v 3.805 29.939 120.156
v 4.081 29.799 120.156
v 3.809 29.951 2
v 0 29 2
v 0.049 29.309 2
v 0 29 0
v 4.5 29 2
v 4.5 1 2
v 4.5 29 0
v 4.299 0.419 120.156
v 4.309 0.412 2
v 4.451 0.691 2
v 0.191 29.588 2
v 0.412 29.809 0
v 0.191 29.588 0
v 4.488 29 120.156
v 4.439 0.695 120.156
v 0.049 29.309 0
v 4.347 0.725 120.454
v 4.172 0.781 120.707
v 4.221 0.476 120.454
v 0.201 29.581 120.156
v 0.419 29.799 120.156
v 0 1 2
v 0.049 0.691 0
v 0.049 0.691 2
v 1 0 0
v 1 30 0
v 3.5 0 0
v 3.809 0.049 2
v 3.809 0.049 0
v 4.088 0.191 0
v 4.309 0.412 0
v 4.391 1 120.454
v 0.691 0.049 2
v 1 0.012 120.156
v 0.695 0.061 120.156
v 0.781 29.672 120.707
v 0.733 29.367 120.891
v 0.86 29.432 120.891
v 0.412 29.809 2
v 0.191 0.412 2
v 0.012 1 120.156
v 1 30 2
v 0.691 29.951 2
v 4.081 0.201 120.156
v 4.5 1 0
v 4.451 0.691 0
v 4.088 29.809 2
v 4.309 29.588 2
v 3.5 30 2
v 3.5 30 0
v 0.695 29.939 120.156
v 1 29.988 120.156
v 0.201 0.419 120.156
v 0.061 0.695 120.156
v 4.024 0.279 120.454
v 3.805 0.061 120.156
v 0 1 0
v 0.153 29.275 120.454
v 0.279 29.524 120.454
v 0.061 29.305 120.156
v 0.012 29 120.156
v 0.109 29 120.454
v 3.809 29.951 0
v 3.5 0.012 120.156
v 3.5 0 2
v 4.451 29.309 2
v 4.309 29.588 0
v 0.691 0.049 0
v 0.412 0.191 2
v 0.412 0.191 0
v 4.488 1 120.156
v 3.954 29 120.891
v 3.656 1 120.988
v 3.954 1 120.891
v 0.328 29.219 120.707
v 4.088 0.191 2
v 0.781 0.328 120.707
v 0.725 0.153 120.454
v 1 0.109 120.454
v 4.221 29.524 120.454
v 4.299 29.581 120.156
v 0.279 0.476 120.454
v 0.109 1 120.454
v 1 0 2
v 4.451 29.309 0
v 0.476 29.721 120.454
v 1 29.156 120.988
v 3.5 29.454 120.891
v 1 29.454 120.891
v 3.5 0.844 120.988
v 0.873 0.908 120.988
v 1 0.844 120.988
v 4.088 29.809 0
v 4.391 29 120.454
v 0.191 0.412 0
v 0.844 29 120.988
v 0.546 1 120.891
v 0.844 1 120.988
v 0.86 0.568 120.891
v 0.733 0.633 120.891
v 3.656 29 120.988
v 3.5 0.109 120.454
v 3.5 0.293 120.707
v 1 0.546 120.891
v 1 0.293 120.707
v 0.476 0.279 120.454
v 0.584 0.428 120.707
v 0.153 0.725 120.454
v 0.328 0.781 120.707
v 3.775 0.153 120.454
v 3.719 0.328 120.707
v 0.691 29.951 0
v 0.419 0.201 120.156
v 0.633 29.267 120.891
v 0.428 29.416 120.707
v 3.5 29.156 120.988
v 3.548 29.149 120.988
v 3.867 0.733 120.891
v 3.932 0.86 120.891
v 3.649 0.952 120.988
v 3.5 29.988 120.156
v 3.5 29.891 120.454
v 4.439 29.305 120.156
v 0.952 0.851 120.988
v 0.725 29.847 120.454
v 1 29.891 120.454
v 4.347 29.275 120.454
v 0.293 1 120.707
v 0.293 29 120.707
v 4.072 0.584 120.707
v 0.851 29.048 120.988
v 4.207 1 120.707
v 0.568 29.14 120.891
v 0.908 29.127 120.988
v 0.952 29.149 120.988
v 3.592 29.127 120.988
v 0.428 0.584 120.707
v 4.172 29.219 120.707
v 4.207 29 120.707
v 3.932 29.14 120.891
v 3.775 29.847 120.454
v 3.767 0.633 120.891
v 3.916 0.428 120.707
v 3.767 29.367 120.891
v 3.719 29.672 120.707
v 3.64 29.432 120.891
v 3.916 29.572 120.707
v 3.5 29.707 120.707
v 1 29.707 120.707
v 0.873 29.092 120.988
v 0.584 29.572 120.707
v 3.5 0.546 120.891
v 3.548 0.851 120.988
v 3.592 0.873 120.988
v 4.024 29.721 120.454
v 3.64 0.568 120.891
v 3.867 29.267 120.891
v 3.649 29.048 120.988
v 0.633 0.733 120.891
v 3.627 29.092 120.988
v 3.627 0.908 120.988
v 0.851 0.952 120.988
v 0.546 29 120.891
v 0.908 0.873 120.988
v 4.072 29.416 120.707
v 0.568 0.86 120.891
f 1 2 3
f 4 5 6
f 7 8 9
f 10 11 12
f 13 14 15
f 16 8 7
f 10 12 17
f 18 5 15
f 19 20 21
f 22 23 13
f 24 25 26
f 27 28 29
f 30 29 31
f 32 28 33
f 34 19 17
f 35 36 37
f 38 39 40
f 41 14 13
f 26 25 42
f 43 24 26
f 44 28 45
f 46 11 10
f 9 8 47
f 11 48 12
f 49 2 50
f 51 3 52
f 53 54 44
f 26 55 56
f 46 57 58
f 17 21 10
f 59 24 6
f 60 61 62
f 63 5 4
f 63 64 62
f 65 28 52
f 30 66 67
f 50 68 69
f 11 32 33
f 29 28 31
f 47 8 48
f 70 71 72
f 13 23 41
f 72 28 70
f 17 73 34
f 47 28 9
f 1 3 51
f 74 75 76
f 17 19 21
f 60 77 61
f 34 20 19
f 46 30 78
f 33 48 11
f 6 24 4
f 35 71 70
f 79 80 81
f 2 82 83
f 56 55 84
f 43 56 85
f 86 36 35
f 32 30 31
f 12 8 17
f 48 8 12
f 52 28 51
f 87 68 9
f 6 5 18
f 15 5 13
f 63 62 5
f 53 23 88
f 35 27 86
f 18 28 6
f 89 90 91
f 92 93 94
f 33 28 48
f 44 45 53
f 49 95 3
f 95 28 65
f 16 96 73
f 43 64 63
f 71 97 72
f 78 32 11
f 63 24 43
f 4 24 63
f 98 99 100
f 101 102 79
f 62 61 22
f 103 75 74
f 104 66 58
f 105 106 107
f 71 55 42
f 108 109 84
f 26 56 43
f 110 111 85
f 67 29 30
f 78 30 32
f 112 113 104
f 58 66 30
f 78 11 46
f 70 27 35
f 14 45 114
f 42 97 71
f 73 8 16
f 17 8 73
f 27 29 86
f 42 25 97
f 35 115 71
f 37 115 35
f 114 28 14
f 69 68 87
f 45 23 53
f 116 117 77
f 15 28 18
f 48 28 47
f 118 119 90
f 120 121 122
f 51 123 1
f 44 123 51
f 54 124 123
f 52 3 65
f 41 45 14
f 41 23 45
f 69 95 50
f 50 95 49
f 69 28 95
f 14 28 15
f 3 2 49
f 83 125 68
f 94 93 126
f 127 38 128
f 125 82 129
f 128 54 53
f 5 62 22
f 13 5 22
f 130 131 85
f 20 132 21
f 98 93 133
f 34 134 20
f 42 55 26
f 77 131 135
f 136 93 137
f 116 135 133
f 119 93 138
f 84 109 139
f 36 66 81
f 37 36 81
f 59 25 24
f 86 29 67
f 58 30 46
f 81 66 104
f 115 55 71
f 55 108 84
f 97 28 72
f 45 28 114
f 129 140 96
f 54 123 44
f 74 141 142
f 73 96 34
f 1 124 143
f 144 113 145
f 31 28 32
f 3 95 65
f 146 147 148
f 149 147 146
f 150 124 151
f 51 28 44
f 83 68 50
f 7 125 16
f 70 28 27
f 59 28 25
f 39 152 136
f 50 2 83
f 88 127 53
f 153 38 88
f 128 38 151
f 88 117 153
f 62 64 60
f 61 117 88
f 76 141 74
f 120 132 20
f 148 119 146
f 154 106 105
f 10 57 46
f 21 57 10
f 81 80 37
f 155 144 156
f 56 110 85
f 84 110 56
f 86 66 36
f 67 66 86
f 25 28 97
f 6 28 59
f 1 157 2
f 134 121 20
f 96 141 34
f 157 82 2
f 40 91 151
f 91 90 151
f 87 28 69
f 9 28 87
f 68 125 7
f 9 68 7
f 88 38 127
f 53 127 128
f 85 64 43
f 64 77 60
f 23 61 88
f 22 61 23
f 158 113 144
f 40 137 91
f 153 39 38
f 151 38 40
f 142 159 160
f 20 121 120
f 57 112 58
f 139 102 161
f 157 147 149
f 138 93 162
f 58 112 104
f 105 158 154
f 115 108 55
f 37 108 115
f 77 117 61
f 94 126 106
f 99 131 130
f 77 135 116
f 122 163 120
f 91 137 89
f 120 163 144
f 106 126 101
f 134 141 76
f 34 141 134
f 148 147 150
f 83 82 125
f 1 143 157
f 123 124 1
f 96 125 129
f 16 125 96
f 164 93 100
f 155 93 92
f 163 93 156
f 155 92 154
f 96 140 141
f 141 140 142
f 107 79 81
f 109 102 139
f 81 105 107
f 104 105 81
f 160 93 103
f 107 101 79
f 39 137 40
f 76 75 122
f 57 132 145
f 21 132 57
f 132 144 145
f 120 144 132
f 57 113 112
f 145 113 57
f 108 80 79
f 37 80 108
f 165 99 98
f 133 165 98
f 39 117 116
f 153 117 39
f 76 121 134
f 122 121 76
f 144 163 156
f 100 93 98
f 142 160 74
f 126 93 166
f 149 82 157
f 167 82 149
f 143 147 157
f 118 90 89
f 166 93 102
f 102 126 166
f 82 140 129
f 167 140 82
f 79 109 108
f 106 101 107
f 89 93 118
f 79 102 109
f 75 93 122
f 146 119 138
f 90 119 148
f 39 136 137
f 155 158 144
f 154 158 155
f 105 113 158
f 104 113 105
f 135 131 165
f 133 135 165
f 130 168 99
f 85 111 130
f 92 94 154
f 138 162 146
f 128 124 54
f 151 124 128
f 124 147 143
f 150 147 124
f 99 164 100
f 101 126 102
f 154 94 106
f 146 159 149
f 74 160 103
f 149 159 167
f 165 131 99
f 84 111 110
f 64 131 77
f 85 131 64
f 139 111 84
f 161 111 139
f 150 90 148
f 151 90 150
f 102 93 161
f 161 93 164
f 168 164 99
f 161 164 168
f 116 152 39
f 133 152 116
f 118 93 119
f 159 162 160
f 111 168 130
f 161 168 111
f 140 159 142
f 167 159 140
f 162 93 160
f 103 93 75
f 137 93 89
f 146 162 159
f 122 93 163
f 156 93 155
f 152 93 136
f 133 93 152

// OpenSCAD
_m3BoltHoleDiameter = 3.2 + 0.2; // plus padding
_m3BoltHoleRadius = _m3BoltHoleDiameter/2;

_mk2HousingLength = 127;
_mk2HousingWidth = 88;
_mk2HousingDepth = 18;

_carraigeThickness = 4.1;
_carraigeLengthSidePadding = 0.2;
_carraigeWidthSidePadding = _carraigeLengthSidePadding;
_carraigeLength = _mk2HousingLength + ((_carraigeThickness + _carraigeLengthSidePadding)*2);
_carraigeWidth = _mk2HousingWidth + ((_carraigeThickness + _carraigeWidthSidePadding)*2);
_carraigeDepth = _carraigeThickness + 14;

_carraigeBeamWidth = 20;
_carraigeRoundingRadius = 1;
_carraigeBeamBoltChannelWidth = _m3BoltHoleDiameter + 0.2; //plus padding
_carraigeBeamBoltChannelCountersinkWidth = _carraigeBeamBoltChannelWidth + 2.5;
_carraigeBeamBoltChannelCountersinkDepth = 3;
_carraigeBeamCutoutRadius = 5;

_tentBeamThickness = 4.5;
_tentBeamWidth = 30;
_tentRoundingRadius = 1;

_tentHeight = 121;
_tentMountingBeamLength = 140;
_tentAngle = 60;

_tentBaseThickness = 5.5;
_tentBaseLength = 130;
_tentBaseWidth = 90;
_frameBaseBeamCutoutOffset = 10;

_baseBeamTriangleCutoutSideLength = _tentBeamWidth*(1/3);
_baseBeamTriangleStrutPadding = 3;
_totalSinglePunchSideLength = _baseBeamTriangleCutoutSideLength + _baseBeamTriangleStrutPadding;

_baseBeamTriangleCutoutEdgePadding = 3.5;
_baseBeamTriangleCutoutLengthOffset = 2.5;
_baseBeamTriangleCutoutWidthOffset = 5;
_baseBeamTriangleWidthQuantity = 6;
_baseBeamTriangleLengthQuantity = 2;

_baseConnectingBeamTriangleCutoutEdgePadding = 3.5;
_baseConnectingBeamTriangleCutoutLengthOffset = 32;
_baseConnectingBeamTriangleCutoutWidthOffset = 2.5;
_baseConnectingBeamTriangleWidthQuantity = 2;
_baseConnectingBeamTriangleLengthQuantity = 5;

_decorativeFrameBeamCutoutRadius = 5;
_decorativeFrameBeamCutoutPadding = 5;
_decorativeFrameBeamCutoutQuantity = 3;
_decorativeFrameBeamCutoutEdgePadding = 10;

/// MAIN START ///
//baseConnectingBeam();
//tentingAssembly();
decorativeFrameBeam(_tentHeight);
//tentingStructure();
//boltChannelPunch(50, _tentBeamThickness+1, _carraigeBeamBoltChannelWidth/2, _carraigeBeamBoltChannelCountersinkWidth/2, _carraigeBeamBoltChannelCountersinkDepth);
//carraigeBeam(50);
//carraige();
/// MAIN END ///

module tentingAssembly()
{
    difference()
    union()
    {
        //possibly break this out into another method
        difference()
        {
            tentingStructure();
            //bolt channel
            //"triangulation"
        }

       translate([7.5,(_tentBaseWidth-_carraigeWidth)/2,1])
            rotate([0,-_tentAngle,0])
                carraige();
    }
}

module tentingStructure()
{
    difference()
    //union()
    {
        union()
        {
            // Parallel to keyboard beam.
            translate([0, (_tentBaseWidth-_tentBeamWidth)/2, 0])
                baseConnectingBeam();

            translate([0, 0, 0])
                baseBeam();
            translate([_tentBaseLength-_tentBeamWidth, 0, 0])
                baseBeam();

            translate([0,0, _tentBaseThickness])
                mountingFrame();
        }

        //Cutout for carraige
        carraigeCutoutSidePadding = 1;
        carraigeCutoutWidth = _carraigeBeamWidth + (carraigeCutoutSidePadding*2);
        translate([7.4, (_tentBaseWidth-carraigeCutoutWidth)/2, 1])
            rotate([0,-_tentAngle,0])
                cube([50, carraigeCutoutWidth, 10]);
    }
}

module baseBeam()
{
    difference()
    {
        roundedCube(size=[_tentBeamWidth, _tentBaseWidth, _tentBaseThickness], radius=_tentRoundingRadius, apply_to="zmax");

        lengthSpaceUnit = _baseBeamTriangleCutoutEdgePadding + _baseBeamTriangleCutoutSideLength;
        widthSpaceUnit = _baseBeamTriangleCutoutEdgePadding + _baseBeamTriangleCutoutSideLength;
        translate([_baseBeamTriangleCutoutLengthOffset, _baseBeamTriangleCutoutWidthOffset,-1])
            for(i=[0:_baseBeamTriangleLengthQuantity-1])
                for(j=[0:_baseBeamTriangleWidthQuantity-1])
                    translate([lengthSpaceUnit*i,widthSpaceUnit*j,-1])
                        boxTrianglePunch(_baseBeamTriangleCutoutSideLength, _baseBeamTriangleStrutPadding, _tentBaseThickness+2);
    }
}

module baseConnectingBeam()
{
    difference()
    {
        roundedCube(size=[_tentBaseLength, _tentBeamWidth, _tentBaseThickness], radius=_tentRoundingRadius, apply_to="zmax");

        lengthSpaceUnit = _baseBeamTriangleCutoutEdgePadding + _baseBeamTriangleCutoutSideLength;
        widthSpaceUnit = _baseBeamTriangleCutoutEdgePadding + _baseBeamTriangleCutoutSideLength;
        translate([_baseConnectingBeamTriangleCutoutLengthOffset, _baseConnectingBeamTriangleCutoutWidthOffset,-1])
            for(i=[0:_baseConnectingBeamTriangleLengthQuantity-1])
                for(j=[0:_baseConnectingBeamTriangleWidthQuantity-1])
                    translate([lengthSpaceUnit*i,widthSpaceUnit*j,-1])
                        boxTrianglePunch(_baseBeamTriangleCutoutSideLength, _baseBeamTriangleStrutPadding, _tentBaseThickness+2);
    }
}

module mountingFrame()
{
    union()
    {
        translate([80,(_tentBaseWidth-_tentBeamWidth)/2, -_tentBaseThickness])
            decorativeFrameBeam(_tentHeight+_tentBaseThickness);

        // Carraige attachment beam
        translate([10,(_tentBaseWidth-_tentBeamWidth)/2,0])
            rotate([0,90-_tentAngle,0])
                attachmentFrameBeam(_tentMountingBeamLength, _frameBaseBeamCutoutOffset);
        // Secondary angled support beam
        translate([120,(_tentBaseWidth-_tentBeamWidth)/2,-_tentBaseThickness])
            rotate([0,-90+_tentAngle,0])
                decorativeFrameBeam(_tentMountingBeamLength*(2.85/5));
    }
}

module attachmentFrameBeam(length, cutoutSideOffset)
{
    difference()
    //union()
    {
        roundedCube(size=[_tentBeamThickness, _tentBeamWidth, length], radius=_tentRoundingRadius, apply_to="zmax");
        cutoutLength = length-(cutoutSideOffset*2);
        translate([-1,_tentBeamWidth/2,cutoutSideOffset+_carraigeBeamBoltChannelWidth/2])
            rotate([90,0,0])
                rotate([0,90,0])
                    boltChannel(cutoutLength, _tentBeamThickness+2, _carraigeBeamBoltChannelWidth/2);
    }
}

module decorativeFrameBeam(length)
{
    roundedCube(size=[_tentBeamThickness, _tentBeamWidth, length], radius=_tentRoundingRadius, apply_to="zmax");
}

module carraige()
{
    union()
    {
        carraigeBody();
    }
}

module carraigeBody()
{
    union()
    {
        //// Keyboard stand-in
        //translate([_carraigeLengthSidePadding + _carraigeThickness, _carraigeWidthSidePadding + _carraigeThickness, _carraigeThickness])
        //    translate([0,0,12]) // Center at Z=0
        //        import("../resources/stl/keyboardMk2.stl");

        // Length-wise beam.
        translate([0, (_carraigeWidth-_carraigeBeamWidth)/2, 0])
            carraigeBeam(_carraigeLength);

        // Width-wise beams.
        translate([(_carraigeLength-_carraigeBeamWidth)*(1/4),0,0])
            translate([_carraigeBeamWidth, 0, 0]) //Center at X=0
                rotate([0,0,90])
                    carraigeBeam(_carraigeWidth);

        translate([(_carraigeLength-_carraigeBeamWidth)*(3/4),0,0])
            translate([_carraigeBeamWidth, 0, 0]) //Center at X=0
                rotate([0,0,90])
                    carraigeBeam(_carraigeWidth);
    }
}

module carraigeBeam(length)
{
    difference()
    //union()
    {
        union()
        {
            cube([length, _carraigeBeamWidth, _carraigeThickness]);

            translate([_carraigeThickness, 0, 0])
                rotate([0,-90,0])
                    roundedCube(size=[_carraigeDepth, _carraigeBeamWidth, _carraigeThickness], radius=_carraigeRoundingRadius, apply_to="z");
            translate([length, 0, 0])
                rotate([0,-90,0])
                    roundedCube(size=[_carraigeDepth, _carraigeBeamWidth, _carraigeThickness], radius=_carraigeRoundingRadius, apply_to="z");
        }

        //Bolt channel cutout
        boltChannelSidePadding = 13;
        totalLength = length + _carraigeThickness*2;
        boltChannelLength =  totalLength - (boltChannelSidePadding*2);
        radiusDifference = (_carraigeBeamBoltChannelCountersinkWidth - _carraigeBeamBoltChannelWidth);
        channelCounterSinkTotalLength = boltChannelLength + radiusDifference*2;
        translate([(totalLength-channelCounterSinkTotalLength)/2, _carraigeBeamWidth/2, -2])
            rotate([0,0,-90])
                boltChannelPunch(boltChannelLength+radiusDifference, _carraigeDepth+1, _carraigeBeamBoltChannelWidth/2, _carraigeBeamBoltChannelCountersinkWidth/2, _carraigeBeamBoltChannelCountersinkDepth);

        //Holding tab cutouts
        translate([-1,_carraigeBeamWidth/2,_carraigeDepth/2])
            rotate([0,90,0])
                cylinder(r=_carraigeBeamCutoutRadius, h=length+2, center=false, $fn=100);
    }
}

//Punches
module boltChannelPunch(length, depth, radius, countersinkRadius, countersinkDepth)
{
    union()
    {
        // Punch portion
        boltChannel(length, depth, radius);
        // Countersink portion
        translate([0,0,countersinkDepth])
            boltChannel(length+(countersinkRadius-radius)*2, depth, countersinkRadius);

    }
}

module boltChannel(length, depth, radius)
{
    union()
    {
        cylinder(r=radius, h=depth, $fn=100);

        translate([-radius,0,0])
            cube([radius*2, length-radius*2, depth]);

        translate([0,length-radius*2,0])
            cylinder(r=radius, h=depth, $fn=100);
    }
}

module boxTrianglePunch(triSideLength, triStrutPadding, punchDepth)
{
    union()
    {
        translate([triSideLength+(triStrutPadding/2), triSideLength+(triStrutPadding/2), 0])
            rotate([0, 0, 180])
                triangle(triSideLength, triSideLength, punchDepth);

        triangle(triSideLength, triSideLength, punchDepth);
    }
}

module triangle(o_len, a_len, depth, center=false)
{
    centroid = center ? [-a_len/3, -o_len/3, -depth/2] : [0, 0, 0];
    translate(centroid) linear_extrude(height=depth)
    {
        polygon(points=[[0,0],[a_len,0],[0,o_len]], paths=[[0,1,2]]);
    }
}

//Utility Methods
/// Builds a cube with rounded corners
/// size - dimension vector
/// center - centered on xyz planes?
/// radius - rounding radius
/// apply_to - which sides to round
module roundedCube(size = [1, 1, 1], center = false, radius = 0.5, apply_to = "all")
{
	// If single value, convert to [x, y, z] vector
	size = (size[0] == undef) ? [size, size, size] : size;

	translate_min = radius;
	translate_xmax = size[0] - radius;
	translate_ymax = size[1] - radius;
	translate_zmax = size[2] - radius;

	diameter = radius * 2;

	obj_translate = (center == false) ?
		[0, 0, 0] : [
			-(size[0] / 2),
			-(size[1] / 2),
			-(size[2] / 2)
		];

	translate(v = obj_translate) {
		hull() {
			for (translate_x = [translate_min, translate_xmax]) {
				x_at = (translate_x == translate_min) ? "min" : "max";
				for (translate_y = [translate_min, translate_ymax]) {
					y_at = (translate_y == translate_min) ? "min" : "max";
					for (translate_z = [translate_min, translate_zmax]) {
						z_at = (translate_z == translate_min) ? "min" : "max";

						translate(v = [translate_x, translate_y, translate_z])
						if (
							(apply_to == "all") ||
							(apply_to == "xmin" && x_at == "min") || (apply_to == "xmax" && x_at == "max") ||
							(apply_to == "ymin" && y_at == "min") || (apply_to == "ymax" && y_at == "max") ||
							(apply_to == "zmin" && z_at == "min") || (apply_to == "zmax" && z_at == "max")
						) {
							sphere(r = radius, $fn=20);
						} else {
							rotate =
								(apply_to == "xmin" || apply_to == "xmax" || apply_to == "x") ? [0, 90, 0] : (
								(apply_to == "ymin" || apply_to == "ymax" || apply_to == "y") ? [90, 90, 0] :
								[0, 0, 0]
							);
							rotate(a = rotate)
							cylinder(h = diameter, r = radius, center = true, $fn=20);
						}
					}
				}
			}
		}
	}
}
